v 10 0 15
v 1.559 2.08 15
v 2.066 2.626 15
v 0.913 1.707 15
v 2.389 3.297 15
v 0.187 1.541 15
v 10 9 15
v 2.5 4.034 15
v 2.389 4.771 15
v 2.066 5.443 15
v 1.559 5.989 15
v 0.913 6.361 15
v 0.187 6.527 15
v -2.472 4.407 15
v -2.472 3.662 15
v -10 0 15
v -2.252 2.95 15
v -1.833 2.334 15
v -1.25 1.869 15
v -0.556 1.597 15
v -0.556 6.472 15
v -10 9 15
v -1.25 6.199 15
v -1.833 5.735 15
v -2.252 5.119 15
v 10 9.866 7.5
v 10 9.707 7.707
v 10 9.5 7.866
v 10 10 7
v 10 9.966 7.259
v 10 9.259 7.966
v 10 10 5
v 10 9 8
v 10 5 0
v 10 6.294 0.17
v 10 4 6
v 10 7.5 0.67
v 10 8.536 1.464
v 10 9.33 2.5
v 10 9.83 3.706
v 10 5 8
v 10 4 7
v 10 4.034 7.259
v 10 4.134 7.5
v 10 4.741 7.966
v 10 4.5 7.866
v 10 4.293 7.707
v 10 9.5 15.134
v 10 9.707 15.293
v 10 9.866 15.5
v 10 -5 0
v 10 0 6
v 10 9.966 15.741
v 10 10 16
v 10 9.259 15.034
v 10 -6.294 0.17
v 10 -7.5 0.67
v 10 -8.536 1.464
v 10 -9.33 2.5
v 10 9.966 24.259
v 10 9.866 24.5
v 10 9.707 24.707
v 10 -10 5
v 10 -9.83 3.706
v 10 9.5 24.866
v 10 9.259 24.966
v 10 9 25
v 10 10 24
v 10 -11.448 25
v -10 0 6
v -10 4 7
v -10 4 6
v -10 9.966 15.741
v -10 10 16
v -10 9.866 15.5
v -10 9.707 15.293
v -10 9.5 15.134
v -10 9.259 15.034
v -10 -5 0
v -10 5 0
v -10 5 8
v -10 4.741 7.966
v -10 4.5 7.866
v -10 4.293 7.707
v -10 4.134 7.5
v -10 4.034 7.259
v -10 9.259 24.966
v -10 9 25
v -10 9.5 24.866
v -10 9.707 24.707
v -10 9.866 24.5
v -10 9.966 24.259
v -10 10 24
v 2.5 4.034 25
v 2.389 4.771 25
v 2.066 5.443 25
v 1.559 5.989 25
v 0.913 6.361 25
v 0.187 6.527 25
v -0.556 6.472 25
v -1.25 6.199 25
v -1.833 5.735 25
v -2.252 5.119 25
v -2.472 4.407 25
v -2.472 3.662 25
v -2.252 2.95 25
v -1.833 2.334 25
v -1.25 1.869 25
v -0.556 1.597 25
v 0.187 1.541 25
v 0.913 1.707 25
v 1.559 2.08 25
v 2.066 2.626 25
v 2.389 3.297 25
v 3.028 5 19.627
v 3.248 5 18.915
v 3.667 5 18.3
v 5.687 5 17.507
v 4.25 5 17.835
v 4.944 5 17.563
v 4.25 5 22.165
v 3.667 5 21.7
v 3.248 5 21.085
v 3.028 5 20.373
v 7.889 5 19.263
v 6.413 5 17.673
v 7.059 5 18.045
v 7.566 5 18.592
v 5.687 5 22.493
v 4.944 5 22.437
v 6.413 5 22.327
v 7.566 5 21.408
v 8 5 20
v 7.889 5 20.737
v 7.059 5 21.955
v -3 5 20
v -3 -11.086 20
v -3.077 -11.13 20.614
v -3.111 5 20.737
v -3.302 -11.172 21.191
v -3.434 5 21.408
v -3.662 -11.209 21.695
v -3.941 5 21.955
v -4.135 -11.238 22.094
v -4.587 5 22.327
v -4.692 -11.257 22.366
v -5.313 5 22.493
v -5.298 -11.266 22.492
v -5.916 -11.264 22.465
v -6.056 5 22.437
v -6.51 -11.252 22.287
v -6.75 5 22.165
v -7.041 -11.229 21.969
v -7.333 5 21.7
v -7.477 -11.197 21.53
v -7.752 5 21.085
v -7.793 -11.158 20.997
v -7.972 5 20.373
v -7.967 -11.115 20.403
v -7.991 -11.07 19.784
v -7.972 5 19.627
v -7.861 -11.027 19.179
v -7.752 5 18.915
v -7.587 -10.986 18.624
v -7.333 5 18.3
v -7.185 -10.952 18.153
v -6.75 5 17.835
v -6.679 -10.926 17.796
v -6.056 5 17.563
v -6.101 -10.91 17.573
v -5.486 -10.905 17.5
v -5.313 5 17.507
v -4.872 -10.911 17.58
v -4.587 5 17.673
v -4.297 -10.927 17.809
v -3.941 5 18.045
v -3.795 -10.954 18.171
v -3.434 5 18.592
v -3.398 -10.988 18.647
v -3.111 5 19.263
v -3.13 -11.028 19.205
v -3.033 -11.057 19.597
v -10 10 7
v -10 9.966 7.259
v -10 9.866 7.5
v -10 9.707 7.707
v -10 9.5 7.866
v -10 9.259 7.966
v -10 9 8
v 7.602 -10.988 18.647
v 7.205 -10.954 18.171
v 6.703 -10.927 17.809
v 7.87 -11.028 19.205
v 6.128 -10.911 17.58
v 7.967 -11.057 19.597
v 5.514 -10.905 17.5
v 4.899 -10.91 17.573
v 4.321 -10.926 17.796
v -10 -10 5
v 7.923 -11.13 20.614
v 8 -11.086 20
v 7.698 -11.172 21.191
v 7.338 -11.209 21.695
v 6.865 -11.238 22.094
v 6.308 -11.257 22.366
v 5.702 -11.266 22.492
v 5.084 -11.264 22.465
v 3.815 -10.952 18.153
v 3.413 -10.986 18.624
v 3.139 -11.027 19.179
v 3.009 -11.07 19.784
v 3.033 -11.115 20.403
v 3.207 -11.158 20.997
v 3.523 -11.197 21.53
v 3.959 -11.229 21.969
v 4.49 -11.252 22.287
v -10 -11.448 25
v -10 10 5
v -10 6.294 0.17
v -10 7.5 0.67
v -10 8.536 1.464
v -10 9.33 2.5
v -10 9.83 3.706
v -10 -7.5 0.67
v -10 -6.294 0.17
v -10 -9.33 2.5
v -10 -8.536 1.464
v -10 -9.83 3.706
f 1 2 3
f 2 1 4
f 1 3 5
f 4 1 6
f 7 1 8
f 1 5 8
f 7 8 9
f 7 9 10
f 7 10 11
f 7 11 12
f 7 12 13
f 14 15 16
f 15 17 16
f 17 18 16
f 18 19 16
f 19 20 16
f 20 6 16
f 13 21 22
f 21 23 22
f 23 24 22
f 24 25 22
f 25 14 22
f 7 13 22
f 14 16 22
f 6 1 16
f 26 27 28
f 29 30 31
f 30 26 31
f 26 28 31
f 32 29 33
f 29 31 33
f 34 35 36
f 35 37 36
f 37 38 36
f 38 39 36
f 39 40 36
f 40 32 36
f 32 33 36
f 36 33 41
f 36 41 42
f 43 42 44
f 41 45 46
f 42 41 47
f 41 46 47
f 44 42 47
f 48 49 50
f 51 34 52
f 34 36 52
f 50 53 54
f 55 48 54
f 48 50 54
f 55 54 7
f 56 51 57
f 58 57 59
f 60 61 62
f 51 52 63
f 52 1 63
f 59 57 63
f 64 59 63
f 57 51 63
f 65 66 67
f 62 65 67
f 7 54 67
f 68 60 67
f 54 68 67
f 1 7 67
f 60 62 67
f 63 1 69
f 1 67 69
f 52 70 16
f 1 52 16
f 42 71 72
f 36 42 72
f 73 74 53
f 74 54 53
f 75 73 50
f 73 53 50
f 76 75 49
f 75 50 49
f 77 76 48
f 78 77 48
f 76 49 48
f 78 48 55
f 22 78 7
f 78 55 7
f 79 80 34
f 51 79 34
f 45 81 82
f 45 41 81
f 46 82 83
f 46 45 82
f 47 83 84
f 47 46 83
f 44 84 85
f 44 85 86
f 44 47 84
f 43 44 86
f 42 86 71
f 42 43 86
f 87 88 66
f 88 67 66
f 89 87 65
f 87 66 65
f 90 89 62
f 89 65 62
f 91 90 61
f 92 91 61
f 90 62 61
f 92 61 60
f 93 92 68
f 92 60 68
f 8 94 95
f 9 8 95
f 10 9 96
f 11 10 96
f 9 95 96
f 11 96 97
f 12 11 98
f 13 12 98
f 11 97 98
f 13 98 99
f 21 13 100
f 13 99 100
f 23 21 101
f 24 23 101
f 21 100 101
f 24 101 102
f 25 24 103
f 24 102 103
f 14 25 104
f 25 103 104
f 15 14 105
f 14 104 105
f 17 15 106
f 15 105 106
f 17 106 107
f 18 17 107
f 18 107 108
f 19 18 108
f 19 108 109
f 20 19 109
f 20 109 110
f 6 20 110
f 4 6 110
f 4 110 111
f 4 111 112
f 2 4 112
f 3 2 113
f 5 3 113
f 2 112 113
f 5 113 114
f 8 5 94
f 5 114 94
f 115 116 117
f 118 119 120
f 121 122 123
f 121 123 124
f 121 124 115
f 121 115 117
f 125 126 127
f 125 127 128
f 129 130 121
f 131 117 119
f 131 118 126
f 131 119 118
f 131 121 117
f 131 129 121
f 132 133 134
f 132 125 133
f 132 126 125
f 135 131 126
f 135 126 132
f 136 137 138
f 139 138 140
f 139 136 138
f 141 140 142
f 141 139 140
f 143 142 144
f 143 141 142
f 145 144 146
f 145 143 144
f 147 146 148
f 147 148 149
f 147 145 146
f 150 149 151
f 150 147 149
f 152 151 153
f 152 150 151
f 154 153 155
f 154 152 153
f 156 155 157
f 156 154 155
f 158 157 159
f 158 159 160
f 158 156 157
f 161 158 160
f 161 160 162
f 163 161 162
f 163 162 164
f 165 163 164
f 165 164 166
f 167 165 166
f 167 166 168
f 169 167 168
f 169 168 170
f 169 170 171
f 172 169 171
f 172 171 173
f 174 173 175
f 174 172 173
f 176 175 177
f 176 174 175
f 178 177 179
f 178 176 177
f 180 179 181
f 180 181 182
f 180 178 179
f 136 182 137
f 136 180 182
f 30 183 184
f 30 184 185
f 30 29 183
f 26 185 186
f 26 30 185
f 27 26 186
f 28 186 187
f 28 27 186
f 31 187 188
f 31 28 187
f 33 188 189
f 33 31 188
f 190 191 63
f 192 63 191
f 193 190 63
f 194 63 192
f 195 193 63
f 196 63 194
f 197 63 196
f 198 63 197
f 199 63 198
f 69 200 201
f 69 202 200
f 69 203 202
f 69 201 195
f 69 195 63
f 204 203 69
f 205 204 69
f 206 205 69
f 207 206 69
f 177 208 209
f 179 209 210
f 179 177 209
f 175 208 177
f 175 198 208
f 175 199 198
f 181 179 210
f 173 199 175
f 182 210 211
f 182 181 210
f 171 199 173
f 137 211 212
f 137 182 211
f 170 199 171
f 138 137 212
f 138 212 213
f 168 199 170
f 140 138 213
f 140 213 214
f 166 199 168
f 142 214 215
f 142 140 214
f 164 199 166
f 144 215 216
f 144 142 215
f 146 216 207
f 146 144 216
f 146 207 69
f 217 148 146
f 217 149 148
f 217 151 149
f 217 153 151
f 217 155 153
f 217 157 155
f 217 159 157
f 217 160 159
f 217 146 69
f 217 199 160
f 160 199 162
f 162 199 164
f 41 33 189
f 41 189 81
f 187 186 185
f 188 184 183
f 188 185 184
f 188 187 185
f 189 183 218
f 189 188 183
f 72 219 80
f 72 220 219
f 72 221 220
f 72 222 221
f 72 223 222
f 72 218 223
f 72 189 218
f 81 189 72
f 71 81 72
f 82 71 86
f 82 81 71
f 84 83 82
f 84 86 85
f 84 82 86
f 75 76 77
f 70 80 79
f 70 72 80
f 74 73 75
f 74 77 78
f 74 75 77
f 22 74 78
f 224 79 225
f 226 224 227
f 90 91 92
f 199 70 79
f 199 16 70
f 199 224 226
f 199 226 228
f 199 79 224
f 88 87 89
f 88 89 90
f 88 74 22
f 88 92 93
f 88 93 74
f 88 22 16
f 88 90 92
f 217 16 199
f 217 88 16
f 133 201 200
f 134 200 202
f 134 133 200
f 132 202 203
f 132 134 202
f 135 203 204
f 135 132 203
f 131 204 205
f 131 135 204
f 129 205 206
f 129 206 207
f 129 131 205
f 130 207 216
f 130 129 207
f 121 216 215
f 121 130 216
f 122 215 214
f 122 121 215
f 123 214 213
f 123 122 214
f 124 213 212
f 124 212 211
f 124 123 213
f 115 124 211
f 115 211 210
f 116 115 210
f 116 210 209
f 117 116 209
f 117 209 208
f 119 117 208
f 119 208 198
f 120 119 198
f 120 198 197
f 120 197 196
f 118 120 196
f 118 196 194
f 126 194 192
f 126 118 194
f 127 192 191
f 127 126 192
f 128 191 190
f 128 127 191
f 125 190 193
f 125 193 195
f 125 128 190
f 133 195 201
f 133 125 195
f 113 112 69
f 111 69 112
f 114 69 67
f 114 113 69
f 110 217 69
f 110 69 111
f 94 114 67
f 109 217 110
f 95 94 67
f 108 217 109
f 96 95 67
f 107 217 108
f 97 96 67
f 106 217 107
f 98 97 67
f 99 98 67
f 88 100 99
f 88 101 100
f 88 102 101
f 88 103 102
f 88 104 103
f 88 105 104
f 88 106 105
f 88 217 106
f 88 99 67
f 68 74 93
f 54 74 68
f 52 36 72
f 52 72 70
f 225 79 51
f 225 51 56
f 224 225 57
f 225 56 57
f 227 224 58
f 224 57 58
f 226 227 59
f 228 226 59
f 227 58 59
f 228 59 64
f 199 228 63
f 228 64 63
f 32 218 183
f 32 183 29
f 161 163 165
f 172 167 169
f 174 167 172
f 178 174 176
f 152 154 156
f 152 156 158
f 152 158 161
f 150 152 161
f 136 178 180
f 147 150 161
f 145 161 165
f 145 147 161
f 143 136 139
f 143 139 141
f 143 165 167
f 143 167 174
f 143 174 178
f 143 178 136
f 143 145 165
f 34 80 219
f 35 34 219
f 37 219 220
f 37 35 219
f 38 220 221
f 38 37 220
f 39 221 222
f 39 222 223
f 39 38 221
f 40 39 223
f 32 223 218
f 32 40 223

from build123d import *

# Parameters (mm, degrees)
F0_W           = 20
F0_H           = 20
F1_DEPTH       = 25
F3_DEPTH       = 25
F4_R           = 2.5
F5_DEPTH       = 10
F7_R           = 5
F8_R           = 1
F10_DEPTH      = 20
F6_R           = 2.5
F11_DEPTH      = 15
F11_DEPTH_BACK = 25


with BuildPart() as f1:
    # F0 (on Top) → F1 (new body)
    with BuildSketch(Plane.XY):
        Rectangle(F0_W, F0_H)
    extrude(amount=F1_DEPTH)

    # F2 (on face) → F3 (cut)
    with BuildSketch(Plane(origin=(-10, 0, 0), x_dir=(0, -1, 0), z_dir=(-1, 0, 0))):
        Polygon((0, 15), (-10, 15), (-10, 8), (-4, 8), (-4, 6), (0, 6), (0, 8), align=None)
    extrude(amount=-F3_DEPTH, mode=Mode.SUBTRACT)

    # F4 (on face) → F5 (cut)
    with BuildSketch(Plane.XY.offset(25)):
        with Locations((0, 4.0342840366)):
            Circle(F4_R)
    extrude(amount=-F5_DEPTH, mode=Mode.SUBTRACT)

    # F7
    f7_edges = [f1.edges().sort_by_distance(p)[0] for p in [
        (0, 10, 0),
        (0, -10, 0),
    ]]
    fillet(f7_edges, radius=F7_R)

    # F8
    f8_edges = [f1.edges().sort_by_distance(p)[0] for p in [
        (0, 10, 15),
        (0, 10, 8),
        (0, 10, 25),
        (0, 4, 8),
    ]]
    fillet(f8_edges, radius=F8_R)

    # F9 (on face) → F10 (join)
    with BuildSketch(Plane(origin=(-10, 0, 0), x_dir=(0, -1, 0), z_dir=(-1, 0, 0))):
        Polygon((11.4480117336, 25), (10, 25), (10, 5), align=None)
    extrude(amount=-F10_DEPTH)

    # F6 (on face) → F11 (cut, two sides)
    with BuildSketch(Plane.XZ.offset(10)) as f11_sk:
        with Locations((-5.5, 20)):
            Circle(F6_R)
        with Locations((5.5, 20)):
            Circle(F6_R)
    extrude(amount=-F11_DEPTH, mode=Mode.SUBTRACT)
    extrude(f11_sk.sketch, amount=F11_DEPTH_BACK, mode=Mode.SUBTRACT)


solid = f1.part
